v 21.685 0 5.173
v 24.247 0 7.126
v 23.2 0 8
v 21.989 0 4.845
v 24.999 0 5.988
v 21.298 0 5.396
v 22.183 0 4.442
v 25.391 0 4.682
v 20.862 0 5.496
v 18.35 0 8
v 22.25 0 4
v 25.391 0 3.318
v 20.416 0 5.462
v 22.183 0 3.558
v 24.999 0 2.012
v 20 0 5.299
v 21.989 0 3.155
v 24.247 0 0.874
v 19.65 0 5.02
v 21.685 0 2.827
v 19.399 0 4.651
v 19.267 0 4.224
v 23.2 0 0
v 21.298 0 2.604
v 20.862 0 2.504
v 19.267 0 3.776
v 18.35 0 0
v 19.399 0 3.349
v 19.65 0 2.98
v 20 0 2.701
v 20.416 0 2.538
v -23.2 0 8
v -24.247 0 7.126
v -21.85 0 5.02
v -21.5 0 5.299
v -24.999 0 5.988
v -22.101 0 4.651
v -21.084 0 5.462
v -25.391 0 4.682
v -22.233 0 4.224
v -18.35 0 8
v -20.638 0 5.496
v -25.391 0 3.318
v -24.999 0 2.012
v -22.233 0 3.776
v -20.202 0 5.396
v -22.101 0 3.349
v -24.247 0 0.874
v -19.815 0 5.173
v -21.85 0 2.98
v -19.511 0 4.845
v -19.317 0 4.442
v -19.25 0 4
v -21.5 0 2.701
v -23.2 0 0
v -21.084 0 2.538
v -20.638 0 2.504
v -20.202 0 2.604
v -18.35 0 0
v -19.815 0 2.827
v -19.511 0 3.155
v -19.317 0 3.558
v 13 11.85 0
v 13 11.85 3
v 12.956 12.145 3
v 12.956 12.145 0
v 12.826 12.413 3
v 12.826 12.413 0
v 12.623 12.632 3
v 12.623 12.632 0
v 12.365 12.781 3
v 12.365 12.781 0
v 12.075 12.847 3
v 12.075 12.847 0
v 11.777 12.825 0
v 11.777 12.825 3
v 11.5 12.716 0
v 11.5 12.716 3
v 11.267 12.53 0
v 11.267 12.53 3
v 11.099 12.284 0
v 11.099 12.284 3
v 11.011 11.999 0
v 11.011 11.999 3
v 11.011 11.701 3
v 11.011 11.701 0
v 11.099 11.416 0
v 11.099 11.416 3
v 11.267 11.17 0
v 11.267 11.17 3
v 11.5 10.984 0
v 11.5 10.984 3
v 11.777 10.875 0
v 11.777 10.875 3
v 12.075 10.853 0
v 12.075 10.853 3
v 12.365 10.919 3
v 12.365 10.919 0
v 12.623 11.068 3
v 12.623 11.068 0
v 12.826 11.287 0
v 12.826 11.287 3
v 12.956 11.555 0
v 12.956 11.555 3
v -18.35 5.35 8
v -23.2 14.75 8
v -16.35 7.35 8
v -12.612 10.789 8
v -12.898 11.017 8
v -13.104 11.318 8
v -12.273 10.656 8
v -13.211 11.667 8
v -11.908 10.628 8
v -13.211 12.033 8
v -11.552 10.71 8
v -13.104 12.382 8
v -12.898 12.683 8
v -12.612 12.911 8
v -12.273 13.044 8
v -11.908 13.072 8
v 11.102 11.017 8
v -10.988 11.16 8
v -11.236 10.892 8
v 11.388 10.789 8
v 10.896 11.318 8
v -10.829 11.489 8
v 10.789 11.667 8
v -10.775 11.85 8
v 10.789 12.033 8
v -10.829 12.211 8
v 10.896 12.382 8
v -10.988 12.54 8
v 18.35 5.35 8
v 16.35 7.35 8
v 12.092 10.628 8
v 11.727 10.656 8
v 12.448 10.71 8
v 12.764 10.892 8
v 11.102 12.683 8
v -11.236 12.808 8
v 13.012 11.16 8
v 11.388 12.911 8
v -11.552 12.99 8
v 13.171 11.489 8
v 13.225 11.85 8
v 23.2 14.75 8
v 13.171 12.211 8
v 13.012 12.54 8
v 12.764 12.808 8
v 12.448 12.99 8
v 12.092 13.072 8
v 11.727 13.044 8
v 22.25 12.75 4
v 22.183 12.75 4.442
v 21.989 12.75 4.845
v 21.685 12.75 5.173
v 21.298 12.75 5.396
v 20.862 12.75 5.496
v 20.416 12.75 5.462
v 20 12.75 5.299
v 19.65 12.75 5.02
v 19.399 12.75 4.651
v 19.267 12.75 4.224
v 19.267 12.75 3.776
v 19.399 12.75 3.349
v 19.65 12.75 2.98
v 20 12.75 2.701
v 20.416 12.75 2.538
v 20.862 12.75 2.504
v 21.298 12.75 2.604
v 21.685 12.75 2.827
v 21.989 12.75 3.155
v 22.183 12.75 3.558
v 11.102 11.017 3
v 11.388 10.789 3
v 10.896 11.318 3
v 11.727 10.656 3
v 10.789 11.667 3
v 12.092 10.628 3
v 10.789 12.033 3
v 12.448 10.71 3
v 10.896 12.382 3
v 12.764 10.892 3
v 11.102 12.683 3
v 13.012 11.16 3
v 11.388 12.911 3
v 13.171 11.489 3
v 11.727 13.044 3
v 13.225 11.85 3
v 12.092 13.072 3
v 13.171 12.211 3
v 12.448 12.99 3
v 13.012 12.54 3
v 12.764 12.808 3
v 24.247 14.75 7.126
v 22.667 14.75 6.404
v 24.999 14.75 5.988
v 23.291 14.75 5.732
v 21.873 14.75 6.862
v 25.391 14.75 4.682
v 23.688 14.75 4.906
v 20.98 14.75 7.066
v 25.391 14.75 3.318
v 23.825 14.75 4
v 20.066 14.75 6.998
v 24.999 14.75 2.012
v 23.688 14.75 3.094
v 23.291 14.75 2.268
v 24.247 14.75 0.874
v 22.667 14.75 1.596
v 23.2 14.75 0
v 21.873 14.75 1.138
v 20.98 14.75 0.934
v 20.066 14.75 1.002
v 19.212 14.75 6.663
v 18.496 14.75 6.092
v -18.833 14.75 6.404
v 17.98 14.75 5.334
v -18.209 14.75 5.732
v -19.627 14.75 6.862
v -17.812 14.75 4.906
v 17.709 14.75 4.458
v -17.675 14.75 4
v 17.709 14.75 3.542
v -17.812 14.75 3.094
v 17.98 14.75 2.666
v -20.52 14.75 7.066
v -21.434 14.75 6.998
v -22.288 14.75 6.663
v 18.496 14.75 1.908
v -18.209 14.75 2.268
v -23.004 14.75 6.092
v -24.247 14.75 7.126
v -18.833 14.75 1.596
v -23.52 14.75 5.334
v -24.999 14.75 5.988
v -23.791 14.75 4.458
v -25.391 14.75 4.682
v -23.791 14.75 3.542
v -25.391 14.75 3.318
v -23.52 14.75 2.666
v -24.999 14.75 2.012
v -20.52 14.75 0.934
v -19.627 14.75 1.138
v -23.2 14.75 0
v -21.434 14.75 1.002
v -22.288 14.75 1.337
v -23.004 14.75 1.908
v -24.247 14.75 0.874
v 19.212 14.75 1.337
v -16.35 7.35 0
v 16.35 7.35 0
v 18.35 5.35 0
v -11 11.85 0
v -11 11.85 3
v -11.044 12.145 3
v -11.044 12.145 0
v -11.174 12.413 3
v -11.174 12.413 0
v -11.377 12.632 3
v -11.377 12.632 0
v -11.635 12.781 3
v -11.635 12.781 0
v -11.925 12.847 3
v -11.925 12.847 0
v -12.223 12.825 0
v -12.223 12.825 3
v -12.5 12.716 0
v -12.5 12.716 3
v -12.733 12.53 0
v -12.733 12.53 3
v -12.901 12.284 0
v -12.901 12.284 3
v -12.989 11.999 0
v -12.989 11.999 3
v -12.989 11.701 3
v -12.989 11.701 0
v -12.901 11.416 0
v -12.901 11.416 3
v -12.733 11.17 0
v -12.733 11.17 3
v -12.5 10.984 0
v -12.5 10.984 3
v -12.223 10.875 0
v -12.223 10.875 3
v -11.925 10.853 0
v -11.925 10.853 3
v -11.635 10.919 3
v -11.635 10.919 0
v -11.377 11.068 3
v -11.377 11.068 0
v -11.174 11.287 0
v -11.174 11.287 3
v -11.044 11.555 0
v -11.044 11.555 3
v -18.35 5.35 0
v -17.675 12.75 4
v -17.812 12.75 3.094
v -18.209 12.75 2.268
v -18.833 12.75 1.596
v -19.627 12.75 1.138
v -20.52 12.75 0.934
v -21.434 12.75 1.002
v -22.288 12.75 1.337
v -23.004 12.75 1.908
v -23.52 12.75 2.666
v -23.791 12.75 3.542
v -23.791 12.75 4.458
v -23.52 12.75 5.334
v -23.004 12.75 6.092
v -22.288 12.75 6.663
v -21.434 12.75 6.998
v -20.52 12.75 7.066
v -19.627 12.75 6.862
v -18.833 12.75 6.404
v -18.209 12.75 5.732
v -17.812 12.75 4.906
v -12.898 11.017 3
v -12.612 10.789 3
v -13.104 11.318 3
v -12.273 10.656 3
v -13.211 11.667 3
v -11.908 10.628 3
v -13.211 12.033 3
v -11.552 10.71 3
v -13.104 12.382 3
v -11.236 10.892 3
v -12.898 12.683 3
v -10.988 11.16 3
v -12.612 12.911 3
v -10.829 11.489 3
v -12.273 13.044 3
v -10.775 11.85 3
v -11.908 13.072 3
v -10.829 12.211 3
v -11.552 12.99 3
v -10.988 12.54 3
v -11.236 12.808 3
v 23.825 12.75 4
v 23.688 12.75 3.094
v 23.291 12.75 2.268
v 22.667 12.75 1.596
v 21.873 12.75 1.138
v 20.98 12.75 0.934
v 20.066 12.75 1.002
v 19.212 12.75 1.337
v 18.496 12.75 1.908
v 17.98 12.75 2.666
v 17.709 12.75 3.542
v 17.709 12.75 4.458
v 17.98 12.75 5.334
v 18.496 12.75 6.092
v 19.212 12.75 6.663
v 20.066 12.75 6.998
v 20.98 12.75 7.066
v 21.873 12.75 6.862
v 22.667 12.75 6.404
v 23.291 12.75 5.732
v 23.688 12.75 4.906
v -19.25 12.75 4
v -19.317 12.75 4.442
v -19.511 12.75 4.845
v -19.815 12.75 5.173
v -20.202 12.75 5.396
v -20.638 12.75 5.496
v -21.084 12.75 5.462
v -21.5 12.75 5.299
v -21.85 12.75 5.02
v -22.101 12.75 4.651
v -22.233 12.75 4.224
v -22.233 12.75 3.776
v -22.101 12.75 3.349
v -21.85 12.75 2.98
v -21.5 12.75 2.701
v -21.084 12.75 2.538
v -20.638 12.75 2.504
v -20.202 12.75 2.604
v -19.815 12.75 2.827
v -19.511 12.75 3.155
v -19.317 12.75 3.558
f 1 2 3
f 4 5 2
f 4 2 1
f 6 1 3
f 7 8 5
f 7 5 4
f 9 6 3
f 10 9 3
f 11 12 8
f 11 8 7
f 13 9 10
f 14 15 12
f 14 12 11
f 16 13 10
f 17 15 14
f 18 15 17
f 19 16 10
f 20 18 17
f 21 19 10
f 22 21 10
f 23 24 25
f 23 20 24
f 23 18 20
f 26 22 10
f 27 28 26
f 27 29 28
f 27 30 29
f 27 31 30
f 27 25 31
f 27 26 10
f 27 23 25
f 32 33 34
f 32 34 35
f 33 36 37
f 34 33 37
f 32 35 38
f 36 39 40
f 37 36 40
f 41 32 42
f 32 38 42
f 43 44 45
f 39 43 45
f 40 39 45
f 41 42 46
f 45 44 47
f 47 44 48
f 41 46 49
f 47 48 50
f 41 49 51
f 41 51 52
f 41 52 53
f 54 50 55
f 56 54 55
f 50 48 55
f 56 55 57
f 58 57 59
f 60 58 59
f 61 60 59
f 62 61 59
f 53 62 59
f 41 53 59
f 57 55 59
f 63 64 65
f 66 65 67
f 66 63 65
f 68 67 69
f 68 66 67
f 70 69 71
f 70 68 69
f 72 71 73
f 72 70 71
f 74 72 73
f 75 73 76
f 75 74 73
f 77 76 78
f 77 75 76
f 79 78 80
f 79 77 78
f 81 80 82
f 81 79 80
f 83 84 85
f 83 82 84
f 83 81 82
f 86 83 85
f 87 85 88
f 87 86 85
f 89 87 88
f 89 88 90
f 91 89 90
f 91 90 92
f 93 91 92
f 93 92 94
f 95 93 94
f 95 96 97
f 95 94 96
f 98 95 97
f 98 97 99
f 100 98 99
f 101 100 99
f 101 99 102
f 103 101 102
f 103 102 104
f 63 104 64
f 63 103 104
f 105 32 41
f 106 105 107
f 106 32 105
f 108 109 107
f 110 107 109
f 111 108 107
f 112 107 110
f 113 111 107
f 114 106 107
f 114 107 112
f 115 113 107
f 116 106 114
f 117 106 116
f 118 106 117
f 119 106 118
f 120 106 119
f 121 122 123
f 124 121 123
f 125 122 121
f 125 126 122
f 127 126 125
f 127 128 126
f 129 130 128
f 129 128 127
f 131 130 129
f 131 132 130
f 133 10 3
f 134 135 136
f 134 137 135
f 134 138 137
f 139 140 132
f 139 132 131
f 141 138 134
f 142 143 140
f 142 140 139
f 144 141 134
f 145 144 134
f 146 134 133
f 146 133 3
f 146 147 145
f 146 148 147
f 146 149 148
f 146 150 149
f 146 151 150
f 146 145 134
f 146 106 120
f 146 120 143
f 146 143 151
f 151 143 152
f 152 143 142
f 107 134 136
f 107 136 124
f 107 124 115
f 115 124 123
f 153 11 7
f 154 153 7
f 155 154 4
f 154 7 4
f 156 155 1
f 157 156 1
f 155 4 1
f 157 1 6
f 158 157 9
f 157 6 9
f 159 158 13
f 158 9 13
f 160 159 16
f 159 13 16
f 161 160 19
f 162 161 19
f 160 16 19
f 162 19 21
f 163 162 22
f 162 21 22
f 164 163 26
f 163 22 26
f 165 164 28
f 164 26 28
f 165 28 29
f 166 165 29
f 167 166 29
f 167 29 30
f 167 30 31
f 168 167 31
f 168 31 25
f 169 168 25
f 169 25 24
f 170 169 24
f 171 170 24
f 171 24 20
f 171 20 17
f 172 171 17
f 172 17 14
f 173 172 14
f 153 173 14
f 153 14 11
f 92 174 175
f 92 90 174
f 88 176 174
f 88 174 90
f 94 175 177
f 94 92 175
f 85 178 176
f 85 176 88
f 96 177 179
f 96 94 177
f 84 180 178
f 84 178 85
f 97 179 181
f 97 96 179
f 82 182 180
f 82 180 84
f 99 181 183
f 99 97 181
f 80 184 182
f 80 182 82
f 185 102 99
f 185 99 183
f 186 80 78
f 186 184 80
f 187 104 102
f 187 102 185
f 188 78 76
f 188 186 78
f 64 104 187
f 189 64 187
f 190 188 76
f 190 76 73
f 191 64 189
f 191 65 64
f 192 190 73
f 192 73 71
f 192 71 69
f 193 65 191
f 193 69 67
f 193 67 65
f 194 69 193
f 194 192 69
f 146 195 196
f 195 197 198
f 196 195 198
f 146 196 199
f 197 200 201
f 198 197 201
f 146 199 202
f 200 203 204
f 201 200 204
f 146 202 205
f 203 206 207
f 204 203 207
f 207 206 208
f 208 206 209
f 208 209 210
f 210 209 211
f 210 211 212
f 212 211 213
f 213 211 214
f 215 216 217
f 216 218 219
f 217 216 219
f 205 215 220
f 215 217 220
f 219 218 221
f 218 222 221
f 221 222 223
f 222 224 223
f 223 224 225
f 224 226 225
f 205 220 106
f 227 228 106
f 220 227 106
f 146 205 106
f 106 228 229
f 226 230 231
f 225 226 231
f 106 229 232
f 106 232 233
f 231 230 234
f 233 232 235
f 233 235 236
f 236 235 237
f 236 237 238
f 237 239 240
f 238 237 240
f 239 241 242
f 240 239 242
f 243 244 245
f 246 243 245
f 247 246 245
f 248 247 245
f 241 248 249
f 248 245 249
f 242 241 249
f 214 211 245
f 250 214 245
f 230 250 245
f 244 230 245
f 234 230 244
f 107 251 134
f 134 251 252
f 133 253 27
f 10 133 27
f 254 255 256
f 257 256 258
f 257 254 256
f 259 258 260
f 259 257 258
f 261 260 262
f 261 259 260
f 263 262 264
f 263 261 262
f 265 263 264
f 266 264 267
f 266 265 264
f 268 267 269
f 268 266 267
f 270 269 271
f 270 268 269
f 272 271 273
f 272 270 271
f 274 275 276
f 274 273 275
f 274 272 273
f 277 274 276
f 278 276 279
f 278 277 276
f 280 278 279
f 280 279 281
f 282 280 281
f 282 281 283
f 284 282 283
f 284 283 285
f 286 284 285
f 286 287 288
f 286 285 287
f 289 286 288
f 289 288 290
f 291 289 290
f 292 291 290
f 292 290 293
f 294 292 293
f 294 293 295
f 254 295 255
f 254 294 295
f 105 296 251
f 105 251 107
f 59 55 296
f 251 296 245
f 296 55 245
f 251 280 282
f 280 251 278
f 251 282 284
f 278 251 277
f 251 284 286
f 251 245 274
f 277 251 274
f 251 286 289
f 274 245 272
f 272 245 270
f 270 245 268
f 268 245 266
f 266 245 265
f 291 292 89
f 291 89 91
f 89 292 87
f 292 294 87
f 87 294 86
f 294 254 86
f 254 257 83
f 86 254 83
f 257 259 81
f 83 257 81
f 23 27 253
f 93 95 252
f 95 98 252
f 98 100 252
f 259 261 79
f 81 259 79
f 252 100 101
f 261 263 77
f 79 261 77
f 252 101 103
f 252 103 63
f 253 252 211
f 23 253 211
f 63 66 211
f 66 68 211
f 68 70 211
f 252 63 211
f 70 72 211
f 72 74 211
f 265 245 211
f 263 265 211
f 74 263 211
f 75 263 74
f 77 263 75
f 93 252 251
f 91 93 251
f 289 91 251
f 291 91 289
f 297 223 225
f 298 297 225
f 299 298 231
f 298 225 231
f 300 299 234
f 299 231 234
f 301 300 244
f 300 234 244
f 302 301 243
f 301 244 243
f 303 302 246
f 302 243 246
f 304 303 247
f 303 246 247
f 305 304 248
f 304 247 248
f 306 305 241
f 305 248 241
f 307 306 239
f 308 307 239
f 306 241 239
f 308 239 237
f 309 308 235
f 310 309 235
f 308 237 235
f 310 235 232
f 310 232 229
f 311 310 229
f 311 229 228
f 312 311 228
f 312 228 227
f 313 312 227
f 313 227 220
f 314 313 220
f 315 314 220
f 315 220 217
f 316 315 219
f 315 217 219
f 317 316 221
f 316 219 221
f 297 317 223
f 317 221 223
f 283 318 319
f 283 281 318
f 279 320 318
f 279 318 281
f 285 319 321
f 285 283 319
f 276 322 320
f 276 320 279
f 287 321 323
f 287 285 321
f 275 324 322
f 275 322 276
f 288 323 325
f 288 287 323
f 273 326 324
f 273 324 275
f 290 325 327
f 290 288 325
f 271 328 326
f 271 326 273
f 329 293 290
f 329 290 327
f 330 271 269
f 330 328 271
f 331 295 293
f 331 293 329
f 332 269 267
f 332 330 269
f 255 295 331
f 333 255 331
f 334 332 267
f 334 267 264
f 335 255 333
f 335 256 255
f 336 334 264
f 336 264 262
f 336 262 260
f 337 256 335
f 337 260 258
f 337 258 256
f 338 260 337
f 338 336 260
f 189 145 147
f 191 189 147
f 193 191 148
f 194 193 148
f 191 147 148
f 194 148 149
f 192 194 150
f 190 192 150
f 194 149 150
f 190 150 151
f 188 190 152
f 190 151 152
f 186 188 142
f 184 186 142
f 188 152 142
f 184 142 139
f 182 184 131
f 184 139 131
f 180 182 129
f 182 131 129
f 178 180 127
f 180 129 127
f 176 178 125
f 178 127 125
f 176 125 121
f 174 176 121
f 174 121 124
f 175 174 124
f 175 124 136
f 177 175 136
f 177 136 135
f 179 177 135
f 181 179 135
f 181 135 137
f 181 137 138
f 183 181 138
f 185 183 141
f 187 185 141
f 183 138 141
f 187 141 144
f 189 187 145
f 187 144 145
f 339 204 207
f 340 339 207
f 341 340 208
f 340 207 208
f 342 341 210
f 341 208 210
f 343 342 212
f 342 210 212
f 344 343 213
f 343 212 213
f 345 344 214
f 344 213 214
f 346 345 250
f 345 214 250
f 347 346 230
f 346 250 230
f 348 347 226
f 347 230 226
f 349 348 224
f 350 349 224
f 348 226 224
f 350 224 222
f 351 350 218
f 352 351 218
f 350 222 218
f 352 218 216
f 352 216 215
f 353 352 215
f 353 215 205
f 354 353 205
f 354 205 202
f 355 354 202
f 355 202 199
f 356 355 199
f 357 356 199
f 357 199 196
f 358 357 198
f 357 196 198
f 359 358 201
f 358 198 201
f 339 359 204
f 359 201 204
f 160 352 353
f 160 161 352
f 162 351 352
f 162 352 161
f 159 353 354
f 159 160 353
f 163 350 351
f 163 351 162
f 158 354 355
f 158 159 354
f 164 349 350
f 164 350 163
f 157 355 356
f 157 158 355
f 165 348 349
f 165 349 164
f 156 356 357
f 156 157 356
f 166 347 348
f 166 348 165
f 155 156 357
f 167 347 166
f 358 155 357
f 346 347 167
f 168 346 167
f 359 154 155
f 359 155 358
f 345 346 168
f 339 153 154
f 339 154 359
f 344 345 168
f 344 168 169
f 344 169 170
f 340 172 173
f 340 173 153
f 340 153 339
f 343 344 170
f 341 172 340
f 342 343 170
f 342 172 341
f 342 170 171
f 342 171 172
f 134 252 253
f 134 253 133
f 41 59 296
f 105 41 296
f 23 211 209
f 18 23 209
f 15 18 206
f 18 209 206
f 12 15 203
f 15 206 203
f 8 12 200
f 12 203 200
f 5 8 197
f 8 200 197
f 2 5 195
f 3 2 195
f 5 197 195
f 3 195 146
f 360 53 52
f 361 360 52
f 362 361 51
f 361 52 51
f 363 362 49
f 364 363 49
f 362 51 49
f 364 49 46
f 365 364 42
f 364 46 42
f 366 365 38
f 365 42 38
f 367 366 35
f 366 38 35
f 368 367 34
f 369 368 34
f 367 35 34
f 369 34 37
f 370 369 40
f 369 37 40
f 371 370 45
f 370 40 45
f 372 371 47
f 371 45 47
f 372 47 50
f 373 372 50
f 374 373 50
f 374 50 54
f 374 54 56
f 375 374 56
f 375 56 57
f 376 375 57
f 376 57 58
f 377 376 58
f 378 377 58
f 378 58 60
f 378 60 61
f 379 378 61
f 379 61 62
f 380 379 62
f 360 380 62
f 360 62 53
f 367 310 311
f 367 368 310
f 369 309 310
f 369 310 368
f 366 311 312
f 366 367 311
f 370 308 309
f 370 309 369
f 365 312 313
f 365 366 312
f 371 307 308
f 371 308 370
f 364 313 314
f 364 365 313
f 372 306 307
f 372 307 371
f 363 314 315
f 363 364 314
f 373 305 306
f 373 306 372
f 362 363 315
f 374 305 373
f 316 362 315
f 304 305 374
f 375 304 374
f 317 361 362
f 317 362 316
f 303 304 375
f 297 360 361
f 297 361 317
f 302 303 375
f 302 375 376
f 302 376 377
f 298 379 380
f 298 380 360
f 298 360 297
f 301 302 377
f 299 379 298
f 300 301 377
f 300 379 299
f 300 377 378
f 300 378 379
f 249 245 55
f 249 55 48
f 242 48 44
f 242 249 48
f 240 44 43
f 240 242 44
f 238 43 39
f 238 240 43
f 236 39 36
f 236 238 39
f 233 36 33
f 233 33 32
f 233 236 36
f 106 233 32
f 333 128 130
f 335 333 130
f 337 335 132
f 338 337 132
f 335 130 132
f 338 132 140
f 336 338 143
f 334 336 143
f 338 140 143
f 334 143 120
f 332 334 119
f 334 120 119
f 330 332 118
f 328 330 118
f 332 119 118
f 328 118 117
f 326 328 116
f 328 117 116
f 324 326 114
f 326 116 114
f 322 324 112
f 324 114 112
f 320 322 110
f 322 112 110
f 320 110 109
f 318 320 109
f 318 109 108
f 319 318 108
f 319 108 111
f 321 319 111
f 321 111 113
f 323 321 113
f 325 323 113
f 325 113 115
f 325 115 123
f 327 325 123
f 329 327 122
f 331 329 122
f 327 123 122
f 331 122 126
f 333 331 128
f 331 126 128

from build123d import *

# Parameters (mm, degrees)
SKETCH1_R               = 1
BOSS_EXTRUDE1_DEPTH     = 8
SKETCH2_R               = 1.5
CUT_EXTRUDE1_DEPTH      = 15.75
BOSS_EXTRUDE2_DEPTH     = 14.75
SKETCH5_R               = 3.075
CUT_EXTRUDE2_DEPTH      = 1
CUT_EXTRUDE2_DEPTH_BACK = 2
CHAMFER2_SIZE           = 2
SKETCH6_R               = 1.225
CUT_EXTRUDE3_DEPTH      = 5


with BuildPart() as part:
    # Sketch1 → Boss-Extrude1 (new body)
    with BuildSketch(Plane.XY):
        Polygon((18.35, 7.35), (18.35, 0), (23.2, 0), (23.2, 14.75), (-23.2, 14.75), (-23.2, 0), (-18.35, 0), (-18.35, 7.35), align=None)
        with Locations((-12, 11.85)):
            Circle(SKETCH1_R, mode=Mode.SUBTRACT)
        with Locations((12, 11.85)):
            Circle(SKETCH1_R, mode=Mode.SUBTRACT)
    extrude(amount=BOSS_EXTRUDE1_DEPTH)

    # Sketch2 → Cut-Extrude1 (cut, through all)
    with BuildSketch(Plane.XZ):
        with Locations((-20.75, 4)):
            Circle(SKETCH2_R)
        with Locations((20.75, 4)):
            Circle(SKETCH2_R)
    extrude(amount=-CUT_EXTRUDE1_DEPTH, mode=Mode.SUBTRACT)

    # Sketch3 → Boss-Extrude2 (add)
    with BuildSketch(Plane(origin=(0, 14.75, 0), x_dir=(1, 0, 0), z_dir=(0, 1, 0))):
        with BuildLine():
            Line((23.2, -8), (23.2, 0))
            ThreePointArc((23.2, 0), (25.440682253, -4), (23.2, -8))
        make_face()
        with BuildLine():
            Line((-23.2, -8), (-23.2, 0))
            ThreePointArc((-23.2, 0), (-25.440682253, -4), (-23.2, -8))
        make_face()
    extrude(amount=-BOSS_EXTRUDE2_DEPTH)

    # Sketch5 → Cut-Extrude2 (cut, two sides)
    with BuildSketch(Plane(origin=(0, 14.75, 0), x_dir=(1, 0, 0), z_dir=(0, 1, 0))) as cut_extrude2_sk:
        with Locations((20.75, -4)):
            Circle(SKETCH5_R)
        with Locations((-20.75, -4)):
            Circle(SKETCH5_R)
    extrude(amount=CUT_EXTRUDE2_DEPTH, mode=Mode.SUBTRACT)
    extrude(cut_extrude2_sk.sketch, amount=-CUT_EXTRUDE2_DEPTH_BACK, mode=Mode.SUBTRACT)

    # Chamfer2
    chamfer2_edges = [part.edges().sort_by_distance(p)[0] for p in [
        (-18.35, 7.35, 4),
        (18.35, 7.35, 4),
    ]]
    chamfer(chamfer2_edges, length=CHAMFER2_SIZE)

    # Sketch6 → Cut-Extrude3 (cut)
    with BuildSketch(Plane.XY.offset(8)):
        with Locations((-12, 11.85)):
            Circle(SKETCH6_R)
        with Locations((12, 11.85)):
            Circle(SKETCH6_R)
    extrude(amount=-CUT_EXTRUDE3_DEPTH, mode=Mode.SUBTRACT)


solid = part.part
